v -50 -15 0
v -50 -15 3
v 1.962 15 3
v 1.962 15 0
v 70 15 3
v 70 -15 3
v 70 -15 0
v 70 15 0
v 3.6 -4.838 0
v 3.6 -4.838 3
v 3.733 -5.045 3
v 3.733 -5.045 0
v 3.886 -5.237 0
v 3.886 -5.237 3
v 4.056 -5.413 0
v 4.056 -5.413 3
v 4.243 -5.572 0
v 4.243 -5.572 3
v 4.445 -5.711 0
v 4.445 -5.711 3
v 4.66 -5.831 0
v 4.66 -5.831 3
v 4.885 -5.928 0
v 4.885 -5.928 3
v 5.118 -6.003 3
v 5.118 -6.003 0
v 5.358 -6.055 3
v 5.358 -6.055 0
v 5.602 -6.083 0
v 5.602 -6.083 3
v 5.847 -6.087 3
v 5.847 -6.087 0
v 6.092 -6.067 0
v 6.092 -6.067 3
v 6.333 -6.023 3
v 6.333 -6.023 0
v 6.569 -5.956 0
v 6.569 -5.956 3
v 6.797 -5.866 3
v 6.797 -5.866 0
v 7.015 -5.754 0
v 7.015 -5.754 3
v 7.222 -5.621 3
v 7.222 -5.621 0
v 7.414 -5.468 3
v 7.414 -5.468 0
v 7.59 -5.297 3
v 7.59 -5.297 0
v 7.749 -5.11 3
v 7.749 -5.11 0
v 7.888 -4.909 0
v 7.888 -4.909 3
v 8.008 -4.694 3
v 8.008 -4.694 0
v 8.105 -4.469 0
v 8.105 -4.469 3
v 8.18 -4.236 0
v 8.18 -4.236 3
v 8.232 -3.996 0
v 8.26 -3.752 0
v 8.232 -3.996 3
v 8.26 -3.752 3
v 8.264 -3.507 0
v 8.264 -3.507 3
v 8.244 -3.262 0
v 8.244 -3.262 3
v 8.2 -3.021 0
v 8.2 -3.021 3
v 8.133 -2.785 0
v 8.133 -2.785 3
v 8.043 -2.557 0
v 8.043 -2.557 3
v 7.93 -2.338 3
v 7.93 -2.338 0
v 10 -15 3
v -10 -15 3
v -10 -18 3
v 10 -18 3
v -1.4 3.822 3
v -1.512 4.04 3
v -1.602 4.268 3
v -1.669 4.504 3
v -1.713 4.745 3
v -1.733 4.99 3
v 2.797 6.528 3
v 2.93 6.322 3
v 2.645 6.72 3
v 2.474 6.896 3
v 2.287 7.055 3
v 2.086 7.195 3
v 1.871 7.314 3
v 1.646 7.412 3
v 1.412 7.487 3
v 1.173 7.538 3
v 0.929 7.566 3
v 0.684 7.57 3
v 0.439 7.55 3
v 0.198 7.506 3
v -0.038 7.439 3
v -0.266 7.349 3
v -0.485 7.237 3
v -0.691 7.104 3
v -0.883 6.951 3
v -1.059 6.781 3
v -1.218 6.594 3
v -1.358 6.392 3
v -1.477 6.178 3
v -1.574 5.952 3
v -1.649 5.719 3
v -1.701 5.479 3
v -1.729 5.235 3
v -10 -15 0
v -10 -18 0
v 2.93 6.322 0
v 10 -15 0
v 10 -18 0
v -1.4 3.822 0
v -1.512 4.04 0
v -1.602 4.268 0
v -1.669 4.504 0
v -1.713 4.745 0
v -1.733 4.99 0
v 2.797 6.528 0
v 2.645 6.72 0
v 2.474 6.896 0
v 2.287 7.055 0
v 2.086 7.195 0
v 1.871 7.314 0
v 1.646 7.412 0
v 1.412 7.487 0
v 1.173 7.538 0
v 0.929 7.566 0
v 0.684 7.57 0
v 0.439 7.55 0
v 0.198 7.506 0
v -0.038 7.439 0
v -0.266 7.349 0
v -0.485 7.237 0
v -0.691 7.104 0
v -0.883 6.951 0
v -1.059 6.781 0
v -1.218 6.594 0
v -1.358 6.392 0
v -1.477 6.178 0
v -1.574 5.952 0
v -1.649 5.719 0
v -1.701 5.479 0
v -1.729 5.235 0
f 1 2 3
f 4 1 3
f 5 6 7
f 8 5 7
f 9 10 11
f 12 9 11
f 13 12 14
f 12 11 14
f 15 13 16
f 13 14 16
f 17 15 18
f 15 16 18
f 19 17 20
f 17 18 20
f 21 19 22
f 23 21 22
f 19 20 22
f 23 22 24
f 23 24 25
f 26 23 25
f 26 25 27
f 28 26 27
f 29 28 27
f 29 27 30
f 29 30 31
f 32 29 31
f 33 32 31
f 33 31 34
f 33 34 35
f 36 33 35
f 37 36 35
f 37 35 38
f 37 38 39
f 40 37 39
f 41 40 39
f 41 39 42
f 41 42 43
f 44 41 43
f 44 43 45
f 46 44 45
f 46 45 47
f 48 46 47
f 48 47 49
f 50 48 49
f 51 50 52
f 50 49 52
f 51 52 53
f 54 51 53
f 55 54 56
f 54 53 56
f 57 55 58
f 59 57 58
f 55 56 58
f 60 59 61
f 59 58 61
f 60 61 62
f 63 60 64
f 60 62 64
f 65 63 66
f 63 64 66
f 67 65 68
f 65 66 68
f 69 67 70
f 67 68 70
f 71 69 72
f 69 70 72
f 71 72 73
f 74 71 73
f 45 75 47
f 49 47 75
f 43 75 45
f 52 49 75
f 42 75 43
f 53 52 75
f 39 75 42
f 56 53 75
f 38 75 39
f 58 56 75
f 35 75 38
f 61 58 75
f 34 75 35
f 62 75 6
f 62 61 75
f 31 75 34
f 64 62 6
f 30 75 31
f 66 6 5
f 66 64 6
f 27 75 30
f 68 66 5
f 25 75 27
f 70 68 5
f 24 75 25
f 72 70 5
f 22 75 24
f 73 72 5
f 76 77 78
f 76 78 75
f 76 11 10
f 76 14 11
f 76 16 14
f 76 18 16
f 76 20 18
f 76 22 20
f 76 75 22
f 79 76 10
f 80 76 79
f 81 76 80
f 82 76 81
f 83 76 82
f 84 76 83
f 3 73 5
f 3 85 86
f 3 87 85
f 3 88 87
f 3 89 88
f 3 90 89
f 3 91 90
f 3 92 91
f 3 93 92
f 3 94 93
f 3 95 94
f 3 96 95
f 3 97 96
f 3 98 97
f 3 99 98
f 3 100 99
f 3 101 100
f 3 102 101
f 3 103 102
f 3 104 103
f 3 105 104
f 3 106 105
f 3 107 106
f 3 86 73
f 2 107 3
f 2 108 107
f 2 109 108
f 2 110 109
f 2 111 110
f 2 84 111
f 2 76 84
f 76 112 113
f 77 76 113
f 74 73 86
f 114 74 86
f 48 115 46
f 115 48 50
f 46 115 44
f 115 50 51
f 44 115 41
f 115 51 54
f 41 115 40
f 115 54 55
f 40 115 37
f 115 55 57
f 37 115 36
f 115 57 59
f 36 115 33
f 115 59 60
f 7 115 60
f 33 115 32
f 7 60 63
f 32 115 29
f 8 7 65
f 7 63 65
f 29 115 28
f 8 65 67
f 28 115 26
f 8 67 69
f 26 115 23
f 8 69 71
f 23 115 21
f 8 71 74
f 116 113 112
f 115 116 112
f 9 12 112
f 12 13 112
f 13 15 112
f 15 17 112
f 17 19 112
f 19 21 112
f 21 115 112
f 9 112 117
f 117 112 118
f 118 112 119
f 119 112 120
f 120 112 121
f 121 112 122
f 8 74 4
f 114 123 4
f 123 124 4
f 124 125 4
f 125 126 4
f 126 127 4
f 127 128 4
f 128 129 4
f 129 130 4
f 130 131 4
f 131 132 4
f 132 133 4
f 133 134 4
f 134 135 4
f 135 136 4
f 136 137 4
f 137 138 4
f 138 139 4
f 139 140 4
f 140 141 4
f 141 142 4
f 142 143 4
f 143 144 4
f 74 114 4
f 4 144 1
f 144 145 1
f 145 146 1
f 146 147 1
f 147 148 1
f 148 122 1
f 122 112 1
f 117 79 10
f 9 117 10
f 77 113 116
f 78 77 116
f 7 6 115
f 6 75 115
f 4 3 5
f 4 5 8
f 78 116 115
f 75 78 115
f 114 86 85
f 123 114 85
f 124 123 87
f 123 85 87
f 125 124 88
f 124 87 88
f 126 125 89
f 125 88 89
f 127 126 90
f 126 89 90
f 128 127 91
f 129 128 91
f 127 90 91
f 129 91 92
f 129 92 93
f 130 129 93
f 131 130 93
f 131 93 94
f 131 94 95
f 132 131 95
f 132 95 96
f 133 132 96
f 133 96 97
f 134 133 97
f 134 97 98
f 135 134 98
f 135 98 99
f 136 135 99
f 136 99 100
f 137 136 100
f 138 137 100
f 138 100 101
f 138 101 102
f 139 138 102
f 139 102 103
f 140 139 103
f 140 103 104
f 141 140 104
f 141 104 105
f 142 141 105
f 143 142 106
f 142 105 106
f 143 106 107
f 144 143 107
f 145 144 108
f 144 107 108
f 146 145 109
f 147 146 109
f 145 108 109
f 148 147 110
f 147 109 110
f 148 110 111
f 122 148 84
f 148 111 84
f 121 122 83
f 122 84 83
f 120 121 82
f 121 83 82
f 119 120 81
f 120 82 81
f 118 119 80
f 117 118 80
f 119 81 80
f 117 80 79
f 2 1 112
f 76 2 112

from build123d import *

# Parameters (mm, degrees)
BOSS_EXTRUDE1_DEPTH     = 3
CUT_EXTRUDE3_DEPTH      = 1
CUT_EXTRUDE3_DEPTH_BACK = 3
CUT_EXTRUDE4_DEPTH      = 4
SKETCH6_W               = 3
SKETCH6_H               = 30
BOSS_EXTRUDE2_DEPTH     = 20


with BuildPart() as part:
    # Sketch1 → Boss-Extrude1 (new body)
    with BuildSketch(Plane.XY):
        Polygon((-10, -15), (-10, -18), (10, -18), (10, -15), (50, -15), (50, 15), (-50, 15), (-50, -15), align=None)
    extrude(amount=BOSS_EXTRUDE1_DEPTH)

    # Sketch4 → Cut-Extrude3 (cut, two sides)
    with BuildSketch(Plane.XY.offset(3)) as cut_extrude3_sk:
        Polygon((-50, -14.220304878), (-50, -15), (1.961524227, 15), (-50, 15), align=None)
    extrude(amount=CUT_EXTRUDE3_DEPTH, mode=Mode.SUBTRACT)
    extrude(cut_extrude3_sk.sketch, amount=-CUT_EXTRUDE3_DEPTH_BACK, mode=Mode.SUBTRACT)

    # Sketch5 → Cut-Extrude4 (cut)
    with BuildSketch(Plane.XY.offset(3)):
        with BuildLine():
            Line((7.930435314, -2.338457268), (2.930435314, 6.32179677))
            ThreePointArc((2.930435314, 6.32179677), (-0.484628196, 7.236860279), (-1.399691705, 3.82179677))
            Line((-1.399691705, 3.82179677), (3.600308295, -4.838457268))
            ThreePointArc((3.600308295, -4.838457268), (7.015371804, -5.753520778), (7.930435314, -2.338457268))
        make_face()
    extrude(amount=-CUT_EXTRUDE4_DEPTH, mode=Mode.SUBTRACT)

    # Sketch6 → Boss-Extrude2 (add)
    with BuildSketch(Plane(origin=(50, 0, 0), x_dir=(0, 0, -1), z_dir=(1, 0, 0))):
        with Locations((-1.5, 0)):
            Rectangle(SKETCH6_W, SKETCH6_H)
    extrude(amount=BOSS_EXTRUDE2_DEPTH)


solid = part.part
